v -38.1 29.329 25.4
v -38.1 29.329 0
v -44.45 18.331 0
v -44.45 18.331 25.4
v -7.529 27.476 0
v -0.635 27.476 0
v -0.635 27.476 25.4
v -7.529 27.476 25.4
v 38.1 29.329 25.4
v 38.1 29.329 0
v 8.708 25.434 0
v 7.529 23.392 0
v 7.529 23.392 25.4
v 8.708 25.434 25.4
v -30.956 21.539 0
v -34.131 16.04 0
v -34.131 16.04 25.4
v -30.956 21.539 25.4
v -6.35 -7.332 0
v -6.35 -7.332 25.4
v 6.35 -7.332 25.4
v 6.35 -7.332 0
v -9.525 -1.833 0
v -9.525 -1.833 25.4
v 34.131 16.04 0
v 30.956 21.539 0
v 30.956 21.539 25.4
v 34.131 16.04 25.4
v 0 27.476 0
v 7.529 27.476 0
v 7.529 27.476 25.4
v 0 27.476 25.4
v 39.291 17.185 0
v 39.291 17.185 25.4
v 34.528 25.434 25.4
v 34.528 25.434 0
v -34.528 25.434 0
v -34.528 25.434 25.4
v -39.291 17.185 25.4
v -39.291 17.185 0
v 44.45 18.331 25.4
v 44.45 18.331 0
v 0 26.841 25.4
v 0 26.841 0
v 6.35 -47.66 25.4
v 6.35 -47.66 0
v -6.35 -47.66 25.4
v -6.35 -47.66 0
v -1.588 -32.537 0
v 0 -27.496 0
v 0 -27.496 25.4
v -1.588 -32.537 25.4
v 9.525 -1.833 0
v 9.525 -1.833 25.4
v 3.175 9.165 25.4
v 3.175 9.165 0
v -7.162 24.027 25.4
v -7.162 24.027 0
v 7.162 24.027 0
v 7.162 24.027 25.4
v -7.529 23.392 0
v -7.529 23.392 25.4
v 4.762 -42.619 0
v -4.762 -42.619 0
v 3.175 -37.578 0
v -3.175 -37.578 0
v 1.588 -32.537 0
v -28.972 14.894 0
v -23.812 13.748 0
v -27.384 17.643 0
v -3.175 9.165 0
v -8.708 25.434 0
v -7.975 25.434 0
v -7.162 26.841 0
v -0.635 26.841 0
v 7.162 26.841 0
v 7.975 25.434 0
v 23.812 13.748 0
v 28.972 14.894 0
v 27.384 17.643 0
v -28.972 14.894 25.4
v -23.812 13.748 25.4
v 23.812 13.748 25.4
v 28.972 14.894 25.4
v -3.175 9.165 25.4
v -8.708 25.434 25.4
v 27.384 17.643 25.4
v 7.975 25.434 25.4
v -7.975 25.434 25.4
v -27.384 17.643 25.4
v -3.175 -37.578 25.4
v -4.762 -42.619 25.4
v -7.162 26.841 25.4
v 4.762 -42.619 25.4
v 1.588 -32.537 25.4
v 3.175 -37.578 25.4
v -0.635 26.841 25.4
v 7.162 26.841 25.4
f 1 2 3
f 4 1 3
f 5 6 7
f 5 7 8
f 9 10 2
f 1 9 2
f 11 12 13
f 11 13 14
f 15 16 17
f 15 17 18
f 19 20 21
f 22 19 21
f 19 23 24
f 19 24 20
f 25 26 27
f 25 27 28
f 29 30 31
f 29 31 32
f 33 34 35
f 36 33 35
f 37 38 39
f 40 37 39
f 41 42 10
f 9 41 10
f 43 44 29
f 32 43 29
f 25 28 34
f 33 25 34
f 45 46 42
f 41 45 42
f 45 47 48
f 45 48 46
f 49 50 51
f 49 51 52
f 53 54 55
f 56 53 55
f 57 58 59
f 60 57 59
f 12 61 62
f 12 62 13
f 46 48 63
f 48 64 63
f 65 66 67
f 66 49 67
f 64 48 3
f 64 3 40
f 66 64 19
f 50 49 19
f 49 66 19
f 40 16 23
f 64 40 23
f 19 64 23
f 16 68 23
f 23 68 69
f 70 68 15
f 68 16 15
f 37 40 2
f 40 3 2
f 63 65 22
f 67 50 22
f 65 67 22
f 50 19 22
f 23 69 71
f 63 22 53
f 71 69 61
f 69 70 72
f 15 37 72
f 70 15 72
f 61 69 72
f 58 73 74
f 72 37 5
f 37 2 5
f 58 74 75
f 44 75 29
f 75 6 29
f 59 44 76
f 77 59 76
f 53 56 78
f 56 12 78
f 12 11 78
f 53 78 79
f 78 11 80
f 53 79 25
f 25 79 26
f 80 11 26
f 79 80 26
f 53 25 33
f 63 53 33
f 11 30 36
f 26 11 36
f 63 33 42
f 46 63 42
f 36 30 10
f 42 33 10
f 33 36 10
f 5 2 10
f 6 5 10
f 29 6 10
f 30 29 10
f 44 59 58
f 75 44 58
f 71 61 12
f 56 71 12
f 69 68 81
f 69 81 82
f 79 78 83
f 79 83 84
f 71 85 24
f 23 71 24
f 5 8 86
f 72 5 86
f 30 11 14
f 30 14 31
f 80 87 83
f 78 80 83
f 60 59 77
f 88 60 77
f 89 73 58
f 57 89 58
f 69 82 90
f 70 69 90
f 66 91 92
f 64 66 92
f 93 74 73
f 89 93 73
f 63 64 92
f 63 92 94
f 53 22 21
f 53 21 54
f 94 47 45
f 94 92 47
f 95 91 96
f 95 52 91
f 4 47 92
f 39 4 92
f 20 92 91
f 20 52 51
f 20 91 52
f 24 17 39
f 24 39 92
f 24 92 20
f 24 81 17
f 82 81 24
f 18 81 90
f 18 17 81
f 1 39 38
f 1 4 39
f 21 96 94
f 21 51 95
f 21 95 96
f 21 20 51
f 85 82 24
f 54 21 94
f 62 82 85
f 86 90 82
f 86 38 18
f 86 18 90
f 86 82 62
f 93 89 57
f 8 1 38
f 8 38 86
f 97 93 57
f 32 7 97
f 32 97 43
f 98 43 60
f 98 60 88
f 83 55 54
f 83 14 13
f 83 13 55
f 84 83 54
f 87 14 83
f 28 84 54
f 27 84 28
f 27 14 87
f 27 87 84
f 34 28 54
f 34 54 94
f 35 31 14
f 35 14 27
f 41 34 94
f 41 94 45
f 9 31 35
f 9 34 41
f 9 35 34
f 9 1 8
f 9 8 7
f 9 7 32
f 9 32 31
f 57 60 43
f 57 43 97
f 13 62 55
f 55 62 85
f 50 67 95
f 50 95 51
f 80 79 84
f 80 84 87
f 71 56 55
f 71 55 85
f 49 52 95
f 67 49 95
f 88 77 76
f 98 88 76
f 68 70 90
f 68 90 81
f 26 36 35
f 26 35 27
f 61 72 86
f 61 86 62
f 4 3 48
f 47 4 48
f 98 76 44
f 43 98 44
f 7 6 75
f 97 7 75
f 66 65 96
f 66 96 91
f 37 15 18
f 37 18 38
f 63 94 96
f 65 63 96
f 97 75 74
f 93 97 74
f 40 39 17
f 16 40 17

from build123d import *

# Parameters (mm, degrees)
F4_DEPTH  = 25.4
F8_DEPTH  = 25.401
F10_DEPTH = 25.401
F11_DEPTH = 25.4


with BuildPart() as f4:
    # F3 (on Top) → F4 (new body)
    with BuildSketch(Plane.XY):
        Polygon((38.1, 29.329394), (-38.1, 29.329394), (-44.45, 18.330871), (-6.35, -47.660265), (6.35, -47.660265), (44.45, 18.330871), align=None)
    extrude(amount=F4_DEPTH)

    # F7 (on Top) → F8 (cut, through all)
    with BuildSketch(Plane.XY):
        Polygon((-3.175, 9.165436), (-9.525, -1.833087), (-6.35, -7.332348), (6.35, -7.332348), (9.525, -1.833087), (3.175, 9.165436), align=None)
    extrude(amount=F8_DEPTH, mode=Mode.SUBTRACT)

    # F9 (on Top) → F10 (cut, through all)
    with BuildSketch(Plane.XY):
        Polygon((39.290625, 17.185192), (34.528125, 25.434084), (30.95625, 21.538773), (34.13125, 16.039512), align=None)
        Polygon((28.971875, 14.893833), (27.384375, 17.643463), (23.8125, 13.748153), align=None)
        Polygon((-30.95625, 21.538773), (-34.528125, 25.434084), (-39.290625, 17.185192), (-34.13125, 16.039512), align=None)
        Polygon((-27.384375, 17.643463), (-28.971875, 14.893833), (-23.8125, 13.748153), align=None)
        Polygon((0, -27.496307), (-1.5875, -32.537296), (1.5875, -32.537296), align=None)
        Polygon((3.175, -37.578286), (-3.175, -37.578286), (-4.7625, -42.619275), (4.7625, -42.619275), align=None)
        Polygon((-7.1625, 24.026792), (-7.975, 25.434084), (-7.1625, 26.841375), (-0.635, 26.841375), (-0.635, 27.476375), (-7.529117, 27.476375), (-8.708235, 25.434084), (-7.529117, 23.391792), (7.529117, 23.391792), (8.708235, 25.434084), (7.529117, 27.476375), (0, 27.476375), (0, 26.841375), (7.1625, 26.841375), (7.975, 25.434084), (7.1625, 24.026792), align=None)
        Polygon((-7.1625, 26.841375), (-7.975, 25.434084), (-7.1625, 24.026792), (7.1625, 24.026792), (7.975, 25.434084), (7.1625, 26.841375), (0, 26.841375), (0, 27.476375), (-0.635, 27.476375), (-0.635, 26.841375), align=None)
    extrude(amount=F10_DEPTH, mode=Mode.SUBTRACT)

    # F9 (on Top) → F11 (join)
    with BuildSketch(Plane.XY):
        Polygon((-7.1625, 26.841375), (-7.975, 25.434084), (-7.1625, 24.026792), (7.1625, 24.026792), (7.975, 25.434084), (7.1625, 26.841375), (0, 26.841375), (0, 27.476375), (-0.635, 27.476375), (-0.635, 26.841375), align=None)
    extrude(amount=F11_DEPTH)


solid = f4.part
